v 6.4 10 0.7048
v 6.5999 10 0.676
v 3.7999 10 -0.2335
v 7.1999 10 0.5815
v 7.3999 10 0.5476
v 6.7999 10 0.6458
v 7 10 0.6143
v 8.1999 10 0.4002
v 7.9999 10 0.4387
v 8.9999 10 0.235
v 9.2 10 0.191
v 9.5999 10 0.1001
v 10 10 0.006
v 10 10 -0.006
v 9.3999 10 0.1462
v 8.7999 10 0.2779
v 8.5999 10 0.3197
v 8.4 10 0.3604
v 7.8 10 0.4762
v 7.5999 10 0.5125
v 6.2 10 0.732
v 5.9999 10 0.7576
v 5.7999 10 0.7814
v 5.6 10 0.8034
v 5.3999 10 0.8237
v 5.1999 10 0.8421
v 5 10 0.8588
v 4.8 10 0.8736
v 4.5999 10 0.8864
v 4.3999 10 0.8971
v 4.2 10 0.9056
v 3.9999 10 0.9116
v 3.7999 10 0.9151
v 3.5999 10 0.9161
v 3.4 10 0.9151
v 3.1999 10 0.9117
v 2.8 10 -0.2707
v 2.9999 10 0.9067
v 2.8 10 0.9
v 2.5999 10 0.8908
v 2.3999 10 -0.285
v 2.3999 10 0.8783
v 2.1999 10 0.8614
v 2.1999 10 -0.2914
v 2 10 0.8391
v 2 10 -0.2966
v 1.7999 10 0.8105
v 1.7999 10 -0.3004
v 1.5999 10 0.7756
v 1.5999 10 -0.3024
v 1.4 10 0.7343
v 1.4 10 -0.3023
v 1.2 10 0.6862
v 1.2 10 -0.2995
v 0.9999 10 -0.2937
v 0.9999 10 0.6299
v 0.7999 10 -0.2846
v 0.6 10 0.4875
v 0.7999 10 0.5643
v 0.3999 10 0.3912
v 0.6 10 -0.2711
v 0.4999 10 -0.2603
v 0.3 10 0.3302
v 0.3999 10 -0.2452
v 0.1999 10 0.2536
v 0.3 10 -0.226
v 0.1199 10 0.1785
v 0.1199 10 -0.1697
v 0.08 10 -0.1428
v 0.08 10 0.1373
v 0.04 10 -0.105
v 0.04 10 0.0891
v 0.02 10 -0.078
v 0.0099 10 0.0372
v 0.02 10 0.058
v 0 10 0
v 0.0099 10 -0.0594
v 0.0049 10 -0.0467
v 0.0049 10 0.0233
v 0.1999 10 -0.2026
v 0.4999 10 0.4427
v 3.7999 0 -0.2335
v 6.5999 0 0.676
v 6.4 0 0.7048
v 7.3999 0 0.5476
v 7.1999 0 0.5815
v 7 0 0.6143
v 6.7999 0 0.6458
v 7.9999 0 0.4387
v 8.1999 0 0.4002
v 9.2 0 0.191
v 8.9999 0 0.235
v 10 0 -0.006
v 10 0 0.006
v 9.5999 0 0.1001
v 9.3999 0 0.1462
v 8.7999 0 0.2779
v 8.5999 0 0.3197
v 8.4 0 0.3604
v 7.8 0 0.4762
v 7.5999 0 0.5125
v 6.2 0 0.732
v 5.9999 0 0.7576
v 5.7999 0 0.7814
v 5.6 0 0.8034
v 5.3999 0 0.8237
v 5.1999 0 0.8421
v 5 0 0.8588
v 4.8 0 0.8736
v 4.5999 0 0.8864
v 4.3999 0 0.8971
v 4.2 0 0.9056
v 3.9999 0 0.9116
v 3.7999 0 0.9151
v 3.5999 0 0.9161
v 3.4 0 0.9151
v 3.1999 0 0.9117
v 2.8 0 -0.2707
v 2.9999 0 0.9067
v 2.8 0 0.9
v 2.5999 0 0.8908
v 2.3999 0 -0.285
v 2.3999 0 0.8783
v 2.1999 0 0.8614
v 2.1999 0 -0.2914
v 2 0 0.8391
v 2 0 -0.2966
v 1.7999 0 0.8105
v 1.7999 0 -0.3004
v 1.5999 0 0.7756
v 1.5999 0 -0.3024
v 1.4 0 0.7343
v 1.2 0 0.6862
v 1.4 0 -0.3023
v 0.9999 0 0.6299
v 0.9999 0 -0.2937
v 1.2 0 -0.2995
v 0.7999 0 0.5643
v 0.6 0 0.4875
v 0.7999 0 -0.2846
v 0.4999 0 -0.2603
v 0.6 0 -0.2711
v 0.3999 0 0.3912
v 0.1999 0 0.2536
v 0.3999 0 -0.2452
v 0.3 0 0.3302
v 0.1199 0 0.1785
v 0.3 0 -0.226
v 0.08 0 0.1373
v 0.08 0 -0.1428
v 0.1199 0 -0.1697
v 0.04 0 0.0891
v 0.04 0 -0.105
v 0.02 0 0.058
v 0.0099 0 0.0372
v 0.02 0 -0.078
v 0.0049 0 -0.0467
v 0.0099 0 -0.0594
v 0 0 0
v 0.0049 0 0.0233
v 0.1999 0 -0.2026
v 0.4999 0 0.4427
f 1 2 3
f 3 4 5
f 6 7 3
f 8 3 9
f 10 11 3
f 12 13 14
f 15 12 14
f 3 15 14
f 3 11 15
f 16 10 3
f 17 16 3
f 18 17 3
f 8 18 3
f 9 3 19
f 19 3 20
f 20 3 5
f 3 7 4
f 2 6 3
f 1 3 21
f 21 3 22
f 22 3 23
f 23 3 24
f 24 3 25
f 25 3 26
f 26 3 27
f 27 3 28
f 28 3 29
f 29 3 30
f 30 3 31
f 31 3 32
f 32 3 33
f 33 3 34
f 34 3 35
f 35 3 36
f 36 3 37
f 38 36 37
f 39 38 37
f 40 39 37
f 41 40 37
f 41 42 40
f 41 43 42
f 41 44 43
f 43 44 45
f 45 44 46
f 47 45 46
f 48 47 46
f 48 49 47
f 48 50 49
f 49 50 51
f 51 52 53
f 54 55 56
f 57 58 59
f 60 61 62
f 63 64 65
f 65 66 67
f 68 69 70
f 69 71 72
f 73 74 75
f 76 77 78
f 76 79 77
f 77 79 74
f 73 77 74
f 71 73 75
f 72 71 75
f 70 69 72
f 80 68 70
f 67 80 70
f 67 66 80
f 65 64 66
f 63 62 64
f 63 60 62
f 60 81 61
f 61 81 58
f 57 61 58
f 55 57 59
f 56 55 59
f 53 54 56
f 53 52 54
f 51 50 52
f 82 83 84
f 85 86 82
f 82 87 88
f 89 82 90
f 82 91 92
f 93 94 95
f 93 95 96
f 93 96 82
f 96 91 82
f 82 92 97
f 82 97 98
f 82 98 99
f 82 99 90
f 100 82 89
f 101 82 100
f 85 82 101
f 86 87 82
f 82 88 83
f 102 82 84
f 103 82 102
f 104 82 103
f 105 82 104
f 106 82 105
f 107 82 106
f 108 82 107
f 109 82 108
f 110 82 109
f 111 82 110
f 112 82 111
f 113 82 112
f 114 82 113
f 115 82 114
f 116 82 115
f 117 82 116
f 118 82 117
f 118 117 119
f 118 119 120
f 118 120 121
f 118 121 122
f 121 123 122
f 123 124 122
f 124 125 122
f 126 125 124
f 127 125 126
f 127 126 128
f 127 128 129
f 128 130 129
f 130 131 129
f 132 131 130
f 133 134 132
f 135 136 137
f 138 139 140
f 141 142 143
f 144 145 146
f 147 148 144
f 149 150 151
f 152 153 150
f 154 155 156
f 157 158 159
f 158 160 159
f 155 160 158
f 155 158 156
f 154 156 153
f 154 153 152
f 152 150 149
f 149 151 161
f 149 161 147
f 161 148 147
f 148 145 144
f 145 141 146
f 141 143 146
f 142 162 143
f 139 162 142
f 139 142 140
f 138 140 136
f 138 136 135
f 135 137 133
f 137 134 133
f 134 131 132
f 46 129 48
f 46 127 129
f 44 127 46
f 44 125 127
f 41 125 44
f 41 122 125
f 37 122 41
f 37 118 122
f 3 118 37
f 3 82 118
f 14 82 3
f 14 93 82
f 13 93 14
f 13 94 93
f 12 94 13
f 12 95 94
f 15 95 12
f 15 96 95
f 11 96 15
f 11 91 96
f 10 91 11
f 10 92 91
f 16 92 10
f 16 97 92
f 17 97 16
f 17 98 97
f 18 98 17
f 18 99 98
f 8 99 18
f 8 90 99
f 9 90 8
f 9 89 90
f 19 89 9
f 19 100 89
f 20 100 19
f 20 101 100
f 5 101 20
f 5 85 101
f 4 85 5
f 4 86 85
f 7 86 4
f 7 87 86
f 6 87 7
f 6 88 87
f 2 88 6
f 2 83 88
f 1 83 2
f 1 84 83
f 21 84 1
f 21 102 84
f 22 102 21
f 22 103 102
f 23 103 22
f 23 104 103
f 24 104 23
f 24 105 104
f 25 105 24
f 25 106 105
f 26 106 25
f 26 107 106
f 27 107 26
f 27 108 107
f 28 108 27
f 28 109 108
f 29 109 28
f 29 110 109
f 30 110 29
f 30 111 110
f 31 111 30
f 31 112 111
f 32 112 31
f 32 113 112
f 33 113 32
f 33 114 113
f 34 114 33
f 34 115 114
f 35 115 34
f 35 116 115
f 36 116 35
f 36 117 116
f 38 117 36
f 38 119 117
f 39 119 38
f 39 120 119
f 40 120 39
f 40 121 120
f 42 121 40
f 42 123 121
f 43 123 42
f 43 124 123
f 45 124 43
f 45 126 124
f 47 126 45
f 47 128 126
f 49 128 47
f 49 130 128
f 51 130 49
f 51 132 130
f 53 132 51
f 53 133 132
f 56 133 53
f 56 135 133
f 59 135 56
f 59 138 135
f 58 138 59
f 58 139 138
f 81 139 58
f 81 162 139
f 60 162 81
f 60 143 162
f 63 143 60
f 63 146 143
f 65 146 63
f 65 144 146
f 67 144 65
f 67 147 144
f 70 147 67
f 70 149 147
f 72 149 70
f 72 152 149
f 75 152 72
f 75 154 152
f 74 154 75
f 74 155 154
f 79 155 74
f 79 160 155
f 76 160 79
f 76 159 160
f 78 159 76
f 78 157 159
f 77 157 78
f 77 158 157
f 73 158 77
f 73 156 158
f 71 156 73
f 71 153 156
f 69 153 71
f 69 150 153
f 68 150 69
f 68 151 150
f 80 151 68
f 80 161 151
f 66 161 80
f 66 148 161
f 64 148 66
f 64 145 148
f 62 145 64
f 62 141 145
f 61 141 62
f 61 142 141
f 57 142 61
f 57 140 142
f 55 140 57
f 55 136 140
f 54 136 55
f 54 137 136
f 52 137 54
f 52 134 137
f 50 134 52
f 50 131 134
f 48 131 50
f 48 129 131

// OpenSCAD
//TEMPORARY

module blade(len=10){
	translate([0,len,0])
		rotate([90,0,0])
			scale([len,len,1])
				linear_extrude(len)
					polygon( // mmm, justified arrays
   [[1.000000, 0.000599], [0.990000, 0.002969], [0.980000, 0.005333], [0.970000, 0.007687], [0.960000, 0.010023], [0.940000, 0.014624], [0.920000, 0.019116], [0.900000, 0.023502], [0.880000, 0.027789], [0.860000, 0.031974], [0.840000, 0.036054], [0.820000, 0.040024], [0.800000, 0.043884], [0.780000, 0.047628], [0.760000, 0.051257], [0.740000, 0.054767], [0.720000, 0.058160], [0.700000, 0.061433], [0.680000, 0.064584], [0.660000, 0.067605], [0.640000, 0.070482], [0.620000, 0.073206], [0.600000, 0.075763], [0.580000, 0.078145], [0.560000, 0.080348], [0.540000, 0.082371], [0.520000, 0.084214], [0.500000, 0.085877], [0.480000, 0.087357], [0.460000, 0.088643], [0.440000, 0.089718], [0.420000, 0.090566], [0.400000, 0.091171], [0.380000, 0.091521], [0.360000, 0.091627], [0.340000, 0.091508], [0.320000, 0.091186], [0.300000, 0.090680], [0.280000, 0.090002], [0.260000, 0.089084], [0.240000, 0.087831], [0.220000, 0.086143], [0.200000, 0.083920], [0.180000, 0.081069], [0.160000, 0.077571], [0.140000, 0.073436], [0.120000, 0.068620], [0.100000, 0.062998], [0.080000, 0.056431], [0.060000, 0.048757], [0.050000, 0.044275], [0.040000, 0.039128], [0.030000, 0.033022], [0.020000, 0.025374], [0.012000, 0.017858], [0.008000, 0.013735], [0.004000, 0.008924], [0.002000, 0.005803], [0.001000, 0.003727], [0.000500, 0.002339], [0.000000, 0.000000], [0.000500,-0.004670], [0.001000,-0.005942], [0.002000,-0.007811], [0.004000,-0.010513], [0.008000,-0.014286], [0.012000,-0.016973], [0.020000,-0.020272], [0.030000,-0.022606], [0.040000,-0.024521], [0.050000,-0.026045], [0.060000,-0.027128], [0.080000,-0.028459], [0.100000,-0.029379], [0.120000,-0.029963], [0.140000,-0.030240], [0.160000,-0.030255], [0.180000,-0.030049], [0.200000,-0.029666], [0.220000,-0.029145], [0.240000,-0.028518], [0.260000,-0.027816], [0.280000,-0.027070], [0.300000,-0.026308], [0.320000,-0.025556], [0.340000,-0.024818], [0.360000,-0.024087], [0.380000,-0.023361], [0.400000,-0.022634], [0.420000,-0.021904], [0.440000,-0.021171], [0.460000,-0.020435], [0.480000,-0.019699], [0.500000,-0.018962], [0.520000,-0.018226], [0.540000,-0.017491], [0.560000,-0.016757], [0.580000,-0.016023], [0.600000,-0.015289], [0.620000,-0.014555], [0.640000,-0.013821], [0.660000,-0.013086], [0.680000,-0.012351], [0.700000,-0.011617], [0.720000,-0.010882], [0.740000,-0.010148], [0.760000,-0.009413], [0.780000,-0.008679], [0.800000,-0.007944], [0.820000,-0.007210], [0.840000,-0.006475], [0.860000,-0.005741], [0.880000,-0.005006], [0.900000,-0.004272], [0.920000,-0.003537], [0.940000,-0.002803], [0.960000,-0.002068], [0.970000,-0.001701], [0.980000,-0.001334], [0.990000,-0.000967], [1.0, -0.000599]] ); /* <----------------- :( -----------------> */
 }
 
 blade();
